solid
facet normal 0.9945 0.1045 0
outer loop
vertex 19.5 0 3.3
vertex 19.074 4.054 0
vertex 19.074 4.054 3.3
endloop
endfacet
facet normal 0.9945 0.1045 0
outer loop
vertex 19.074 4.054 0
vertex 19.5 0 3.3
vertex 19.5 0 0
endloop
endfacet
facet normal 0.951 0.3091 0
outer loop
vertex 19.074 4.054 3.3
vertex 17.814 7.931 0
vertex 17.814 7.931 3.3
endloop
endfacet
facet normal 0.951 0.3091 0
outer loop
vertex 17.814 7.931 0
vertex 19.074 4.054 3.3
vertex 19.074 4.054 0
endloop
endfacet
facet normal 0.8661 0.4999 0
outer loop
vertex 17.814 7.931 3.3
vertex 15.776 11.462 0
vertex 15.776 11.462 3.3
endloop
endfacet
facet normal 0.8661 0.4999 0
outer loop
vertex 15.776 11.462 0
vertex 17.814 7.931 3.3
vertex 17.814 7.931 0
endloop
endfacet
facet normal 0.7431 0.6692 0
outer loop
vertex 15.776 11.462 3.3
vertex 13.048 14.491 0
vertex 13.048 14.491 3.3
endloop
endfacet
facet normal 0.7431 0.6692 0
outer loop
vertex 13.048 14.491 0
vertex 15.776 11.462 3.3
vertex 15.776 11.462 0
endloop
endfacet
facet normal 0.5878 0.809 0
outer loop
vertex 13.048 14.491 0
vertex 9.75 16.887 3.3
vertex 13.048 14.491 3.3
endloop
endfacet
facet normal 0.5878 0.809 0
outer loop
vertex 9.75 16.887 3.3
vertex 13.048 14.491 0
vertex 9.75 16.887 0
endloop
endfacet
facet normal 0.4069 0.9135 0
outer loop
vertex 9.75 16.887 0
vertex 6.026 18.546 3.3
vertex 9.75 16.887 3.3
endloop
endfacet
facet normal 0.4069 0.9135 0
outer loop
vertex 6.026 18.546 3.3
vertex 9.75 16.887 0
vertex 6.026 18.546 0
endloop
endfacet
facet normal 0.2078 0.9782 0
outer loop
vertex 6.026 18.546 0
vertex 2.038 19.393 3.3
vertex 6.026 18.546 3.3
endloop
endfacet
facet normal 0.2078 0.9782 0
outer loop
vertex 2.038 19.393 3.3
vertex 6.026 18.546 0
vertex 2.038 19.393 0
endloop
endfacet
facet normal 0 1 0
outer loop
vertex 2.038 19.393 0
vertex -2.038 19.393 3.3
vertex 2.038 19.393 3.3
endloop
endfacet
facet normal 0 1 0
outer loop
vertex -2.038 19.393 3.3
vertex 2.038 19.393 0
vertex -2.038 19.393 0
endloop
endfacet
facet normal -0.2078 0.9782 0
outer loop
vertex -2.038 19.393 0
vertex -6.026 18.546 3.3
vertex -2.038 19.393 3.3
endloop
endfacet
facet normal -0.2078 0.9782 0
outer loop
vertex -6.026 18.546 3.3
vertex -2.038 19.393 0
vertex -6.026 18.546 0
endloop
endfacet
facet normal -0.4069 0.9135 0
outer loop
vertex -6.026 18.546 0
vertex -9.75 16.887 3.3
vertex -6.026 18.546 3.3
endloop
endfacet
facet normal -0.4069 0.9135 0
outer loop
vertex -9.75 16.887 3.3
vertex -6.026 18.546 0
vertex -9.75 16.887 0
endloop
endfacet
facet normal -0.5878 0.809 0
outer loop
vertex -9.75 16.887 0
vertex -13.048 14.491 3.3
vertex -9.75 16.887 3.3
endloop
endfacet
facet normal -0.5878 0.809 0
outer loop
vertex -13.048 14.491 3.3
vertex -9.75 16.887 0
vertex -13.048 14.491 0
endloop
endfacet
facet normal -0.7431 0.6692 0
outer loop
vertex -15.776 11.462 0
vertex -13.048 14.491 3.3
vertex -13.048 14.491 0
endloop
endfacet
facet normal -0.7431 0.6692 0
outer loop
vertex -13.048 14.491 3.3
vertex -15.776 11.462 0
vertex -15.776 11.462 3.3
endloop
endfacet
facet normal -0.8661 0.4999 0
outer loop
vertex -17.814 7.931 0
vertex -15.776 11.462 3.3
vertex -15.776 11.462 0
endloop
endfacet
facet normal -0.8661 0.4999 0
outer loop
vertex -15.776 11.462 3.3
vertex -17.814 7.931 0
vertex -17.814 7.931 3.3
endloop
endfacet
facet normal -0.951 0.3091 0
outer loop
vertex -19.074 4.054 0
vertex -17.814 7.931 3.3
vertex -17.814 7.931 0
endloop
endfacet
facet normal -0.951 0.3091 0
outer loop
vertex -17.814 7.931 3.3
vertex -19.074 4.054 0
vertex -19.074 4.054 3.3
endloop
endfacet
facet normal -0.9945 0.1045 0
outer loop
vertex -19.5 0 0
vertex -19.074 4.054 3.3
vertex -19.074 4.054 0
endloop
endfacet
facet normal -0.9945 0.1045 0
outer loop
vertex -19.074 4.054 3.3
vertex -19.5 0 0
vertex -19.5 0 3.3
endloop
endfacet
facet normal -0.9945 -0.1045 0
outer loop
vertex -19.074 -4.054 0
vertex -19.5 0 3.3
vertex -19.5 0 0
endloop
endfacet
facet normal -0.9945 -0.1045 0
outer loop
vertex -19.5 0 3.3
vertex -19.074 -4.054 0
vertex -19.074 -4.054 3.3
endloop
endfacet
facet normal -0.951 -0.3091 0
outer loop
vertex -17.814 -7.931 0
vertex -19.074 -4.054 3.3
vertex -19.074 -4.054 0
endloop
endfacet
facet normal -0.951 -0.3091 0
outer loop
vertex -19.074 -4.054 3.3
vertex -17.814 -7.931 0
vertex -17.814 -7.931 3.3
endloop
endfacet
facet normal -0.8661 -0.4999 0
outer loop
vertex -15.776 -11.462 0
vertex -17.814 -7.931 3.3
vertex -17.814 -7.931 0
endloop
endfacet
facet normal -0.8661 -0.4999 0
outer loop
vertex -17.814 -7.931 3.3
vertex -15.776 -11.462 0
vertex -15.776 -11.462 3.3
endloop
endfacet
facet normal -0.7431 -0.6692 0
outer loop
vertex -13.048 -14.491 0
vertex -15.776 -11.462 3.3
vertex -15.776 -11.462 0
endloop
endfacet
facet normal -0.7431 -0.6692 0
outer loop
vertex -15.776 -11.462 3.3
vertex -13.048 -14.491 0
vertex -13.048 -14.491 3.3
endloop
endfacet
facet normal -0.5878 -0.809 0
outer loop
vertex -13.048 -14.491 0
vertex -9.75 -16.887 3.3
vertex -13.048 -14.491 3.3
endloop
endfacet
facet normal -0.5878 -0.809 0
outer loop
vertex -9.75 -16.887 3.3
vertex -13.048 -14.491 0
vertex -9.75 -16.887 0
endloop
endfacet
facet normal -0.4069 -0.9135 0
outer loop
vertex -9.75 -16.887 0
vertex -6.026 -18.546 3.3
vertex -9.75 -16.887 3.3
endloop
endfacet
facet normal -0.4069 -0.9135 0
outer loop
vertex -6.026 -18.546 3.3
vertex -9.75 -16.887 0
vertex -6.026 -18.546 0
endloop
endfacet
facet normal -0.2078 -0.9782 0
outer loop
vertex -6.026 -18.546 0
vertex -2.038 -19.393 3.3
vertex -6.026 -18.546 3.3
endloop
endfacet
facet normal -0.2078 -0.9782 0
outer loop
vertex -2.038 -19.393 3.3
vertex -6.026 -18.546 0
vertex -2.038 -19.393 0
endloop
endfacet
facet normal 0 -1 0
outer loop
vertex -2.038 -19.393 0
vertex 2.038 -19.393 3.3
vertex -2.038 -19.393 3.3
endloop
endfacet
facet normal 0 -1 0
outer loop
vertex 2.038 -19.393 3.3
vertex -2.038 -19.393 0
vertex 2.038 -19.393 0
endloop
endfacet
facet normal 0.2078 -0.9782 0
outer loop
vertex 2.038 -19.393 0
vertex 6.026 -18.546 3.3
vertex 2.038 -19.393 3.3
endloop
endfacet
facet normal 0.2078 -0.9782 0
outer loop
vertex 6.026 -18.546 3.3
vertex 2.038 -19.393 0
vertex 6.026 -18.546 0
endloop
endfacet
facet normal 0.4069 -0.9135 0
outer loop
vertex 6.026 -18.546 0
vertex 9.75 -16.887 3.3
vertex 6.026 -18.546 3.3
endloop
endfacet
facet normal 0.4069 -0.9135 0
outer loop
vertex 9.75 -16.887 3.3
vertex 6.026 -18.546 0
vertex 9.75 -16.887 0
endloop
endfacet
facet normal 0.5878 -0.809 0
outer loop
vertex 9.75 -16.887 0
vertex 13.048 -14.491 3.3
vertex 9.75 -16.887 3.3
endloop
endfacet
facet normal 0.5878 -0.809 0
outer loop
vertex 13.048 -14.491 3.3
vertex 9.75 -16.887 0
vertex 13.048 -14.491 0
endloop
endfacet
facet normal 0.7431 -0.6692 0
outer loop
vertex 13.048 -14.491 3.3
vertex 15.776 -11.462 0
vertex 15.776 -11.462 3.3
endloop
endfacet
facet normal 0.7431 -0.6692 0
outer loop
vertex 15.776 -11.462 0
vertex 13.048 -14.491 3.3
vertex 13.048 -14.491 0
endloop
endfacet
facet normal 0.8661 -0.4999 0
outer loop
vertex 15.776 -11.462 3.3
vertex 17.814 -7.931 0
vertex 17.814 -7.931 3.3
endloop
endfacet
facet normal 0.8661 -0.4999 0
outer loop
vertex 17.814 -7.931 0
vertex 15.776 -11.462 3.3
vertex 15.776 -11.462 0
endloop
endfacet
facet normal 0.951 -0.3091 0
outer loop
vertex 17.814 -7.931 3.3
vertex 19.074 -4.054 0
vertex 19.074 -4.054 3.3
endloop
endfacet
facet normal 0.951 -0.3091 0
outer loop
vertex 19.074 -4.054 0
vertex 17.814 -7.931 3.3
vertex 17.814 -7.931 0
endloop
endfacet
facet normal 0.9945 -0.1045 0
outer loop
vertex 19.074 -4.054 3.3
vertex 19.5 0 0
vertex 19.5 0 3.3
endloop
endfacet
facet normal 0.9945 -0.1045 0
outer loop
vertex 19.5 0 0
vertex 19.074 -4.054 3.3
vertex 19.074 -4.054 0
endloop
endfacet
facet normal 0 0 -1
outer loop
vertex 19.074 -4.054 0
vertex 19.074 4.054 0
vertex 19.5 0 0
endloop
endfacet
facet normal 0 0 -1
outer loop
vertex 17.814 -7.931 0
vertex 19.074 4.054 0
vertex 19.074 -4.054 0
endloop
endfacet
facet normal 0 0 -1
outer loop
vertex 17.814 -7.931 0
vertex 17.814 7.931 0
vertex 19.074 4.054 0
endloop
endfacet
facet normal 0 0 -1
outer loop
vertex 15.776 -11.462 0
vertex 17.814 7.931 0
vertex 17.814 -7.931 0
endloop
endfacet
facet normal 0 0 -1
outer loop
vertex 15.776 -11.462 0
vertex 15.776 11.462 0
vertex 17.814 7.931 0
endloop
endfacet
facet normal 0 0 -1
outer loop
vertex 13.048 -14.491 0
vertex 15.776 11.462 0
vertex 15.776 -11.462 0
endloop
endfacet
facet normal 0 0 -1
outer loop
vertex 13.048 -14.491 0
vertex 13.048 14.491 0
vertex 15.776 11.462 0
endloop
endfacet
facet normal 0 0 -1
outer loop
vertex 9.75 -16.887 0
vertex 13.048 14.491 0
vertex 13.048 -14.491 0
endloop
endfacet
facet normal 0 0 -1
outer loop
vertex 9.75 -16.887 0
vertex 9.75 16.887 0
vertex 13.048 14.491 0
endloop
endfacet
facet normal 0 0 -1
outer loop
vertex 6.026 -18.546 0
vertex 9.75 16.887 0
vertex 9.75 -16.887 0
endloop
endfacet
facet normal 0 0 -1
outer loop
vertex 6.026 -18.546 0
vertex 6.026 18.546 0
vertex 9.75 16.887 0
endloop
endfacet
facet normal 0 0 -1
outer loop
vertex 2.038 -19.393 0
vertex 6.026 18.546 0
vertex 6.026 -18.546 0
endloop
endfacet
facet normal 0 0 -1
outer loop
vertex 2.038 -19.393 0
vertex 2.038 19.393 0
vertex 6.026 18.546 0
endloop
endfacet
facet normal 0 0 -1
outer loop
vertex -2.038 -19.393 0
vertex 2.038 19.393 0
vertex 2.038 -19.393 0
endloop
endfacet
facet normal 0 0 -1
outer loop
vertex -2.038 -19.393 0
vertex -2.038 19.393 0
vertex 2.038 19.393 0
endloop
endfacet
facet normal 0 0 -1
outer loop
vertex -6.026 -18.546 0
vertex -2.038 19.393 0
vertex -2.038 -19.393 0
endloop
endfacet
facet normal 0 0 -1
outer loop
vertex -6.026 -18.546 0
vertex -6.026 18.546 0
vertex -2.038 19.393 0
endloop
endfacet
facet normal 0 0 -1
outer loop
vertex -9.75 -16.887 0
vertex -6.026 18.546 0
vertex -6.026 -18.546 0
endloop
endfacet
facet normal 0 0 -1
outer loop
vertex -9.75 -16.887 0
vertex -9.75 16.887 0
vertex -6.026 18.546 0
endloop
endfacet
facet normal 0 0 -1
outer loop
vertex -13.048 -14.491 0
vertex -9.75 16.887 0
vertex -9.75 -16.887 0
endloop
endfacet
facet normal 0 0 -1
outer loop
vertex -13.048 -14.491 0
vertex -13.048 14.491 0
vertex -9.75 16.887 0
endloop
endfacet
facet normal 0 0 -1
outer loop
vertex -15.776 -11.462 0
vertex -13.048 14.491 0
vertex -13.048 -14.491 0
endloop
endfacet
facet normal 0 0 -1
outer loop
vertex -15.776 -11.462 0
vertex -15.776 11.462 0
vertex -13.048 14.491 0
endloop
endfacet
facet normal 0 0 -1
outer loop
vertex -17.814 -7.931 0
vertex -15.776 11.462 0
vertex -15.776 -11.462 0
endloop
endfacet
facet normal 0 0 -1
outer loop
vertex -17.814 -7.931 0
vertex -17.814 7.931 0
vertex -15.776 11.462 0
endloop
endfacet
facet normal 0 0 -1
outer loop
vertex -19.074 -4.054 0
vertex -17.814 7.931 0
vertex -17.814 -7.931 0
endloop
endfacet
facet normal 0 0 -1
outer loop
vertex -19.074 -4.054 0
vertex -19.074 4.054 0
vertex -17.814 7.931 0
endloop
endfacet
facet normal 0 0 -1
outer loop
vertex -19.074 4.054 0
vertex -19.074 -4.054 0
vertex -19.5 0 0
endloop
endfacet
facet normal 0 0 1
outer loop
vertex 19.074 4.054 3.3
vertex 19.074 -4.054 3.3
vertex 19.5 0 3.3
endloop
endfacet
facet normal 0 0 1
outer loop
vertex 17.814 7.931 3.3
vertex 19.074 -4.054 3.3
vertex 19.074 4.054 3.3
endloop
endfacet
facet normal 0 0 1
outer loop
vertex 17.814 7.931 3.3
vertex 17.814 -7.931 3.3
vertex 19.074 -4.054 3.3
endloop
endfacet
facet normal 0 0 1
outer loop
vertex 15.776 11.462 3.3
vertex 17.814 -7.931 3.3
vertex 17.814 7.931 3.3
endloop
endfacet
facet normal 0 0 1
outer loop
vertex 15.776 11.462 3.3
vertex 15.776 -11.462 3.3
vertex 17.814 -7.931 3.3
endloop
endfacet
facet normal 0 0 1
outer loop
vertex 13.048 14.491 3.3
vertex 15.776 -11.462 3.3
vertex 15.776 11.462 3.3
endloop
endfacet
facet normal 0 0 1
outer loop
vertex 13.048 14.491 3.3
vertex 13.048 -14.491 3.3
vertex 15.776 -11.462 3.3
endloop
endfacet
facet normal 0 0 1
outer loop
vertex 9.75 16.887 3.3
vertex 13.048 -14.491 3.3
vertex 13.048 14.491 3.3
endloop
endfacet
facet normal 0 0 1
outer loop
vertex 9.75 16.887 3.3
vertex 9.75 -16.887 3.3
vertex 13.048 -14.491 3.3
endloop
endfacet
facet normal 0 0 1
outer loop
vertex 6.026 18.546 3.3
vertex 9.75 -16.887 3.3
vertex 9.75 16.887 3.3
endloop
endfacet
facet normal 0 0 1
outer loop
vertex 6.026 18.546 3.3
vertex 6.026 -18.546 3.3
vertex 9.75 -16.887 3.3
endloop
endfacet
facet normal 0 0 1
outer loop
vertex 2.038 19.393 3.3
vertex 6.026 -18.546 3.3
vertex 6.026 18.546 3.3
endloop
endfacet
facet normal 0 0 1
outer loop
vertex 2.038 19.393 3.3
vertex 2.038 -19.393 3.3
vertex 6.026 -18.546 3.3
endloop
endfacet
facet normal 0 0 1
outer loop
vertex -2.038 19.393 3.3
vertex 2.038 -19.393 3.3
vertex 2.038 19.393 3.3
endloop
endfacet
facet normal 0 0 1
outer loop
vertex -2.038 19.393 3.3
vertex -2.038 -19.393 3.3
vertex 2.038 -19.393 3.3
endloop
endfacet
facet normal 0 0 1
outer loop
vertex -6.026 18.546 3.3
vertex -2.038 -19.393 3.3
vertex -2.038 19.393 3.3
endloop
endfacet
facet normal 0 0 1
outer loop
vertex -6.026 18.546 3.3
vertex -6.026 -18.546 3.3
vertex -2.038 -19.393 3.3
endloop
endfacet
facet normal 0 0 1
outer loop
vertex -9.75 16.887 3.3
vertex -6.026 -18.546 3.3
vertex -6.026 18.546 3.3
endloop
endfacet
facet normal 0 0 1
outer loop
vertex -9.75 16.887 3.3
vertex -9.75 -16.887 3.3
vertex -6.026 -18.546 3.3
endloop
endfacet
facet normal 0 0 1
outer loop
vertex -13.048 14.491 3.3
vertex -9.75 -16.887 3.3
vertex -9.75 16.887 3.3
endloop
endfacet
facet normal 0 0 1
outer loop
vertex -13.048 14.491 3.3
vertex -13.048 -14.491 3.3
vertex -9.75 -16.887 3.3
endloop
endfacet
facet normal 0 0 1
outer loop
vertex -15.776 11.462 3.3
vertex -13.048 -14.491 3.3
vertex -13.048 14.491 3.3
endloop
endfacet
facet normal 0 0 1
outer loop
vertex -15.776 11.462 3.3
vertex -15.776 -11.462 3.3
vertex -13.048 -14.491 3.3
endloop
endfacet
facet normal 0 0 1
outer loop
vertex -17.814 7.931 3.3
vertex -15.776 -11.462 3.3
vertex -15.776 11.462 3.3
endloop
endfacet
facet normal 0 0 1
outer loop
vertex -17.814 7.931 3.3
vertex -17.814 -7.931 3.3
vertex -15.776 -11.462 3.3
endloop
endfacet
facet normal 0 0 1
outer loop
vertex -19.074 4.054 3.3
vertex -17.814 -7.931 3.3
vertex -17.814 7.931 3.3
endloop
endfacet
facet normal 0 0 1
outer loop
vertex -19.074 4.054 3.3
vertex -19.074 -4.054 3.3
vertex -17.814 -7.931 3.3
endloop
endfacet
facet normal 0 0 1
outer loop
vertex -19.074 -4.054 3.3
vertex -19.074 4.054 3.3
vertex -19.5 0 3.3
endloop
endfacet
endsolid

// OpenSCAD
casino_chip_radius = 39/2;
casino_chip_height = 3.3;

module casino_chip(center, r = casino_chip_radius, h=casino_chip_height) {
    cylinder(h=h, r = r, center = center);
}

casino_chip();
